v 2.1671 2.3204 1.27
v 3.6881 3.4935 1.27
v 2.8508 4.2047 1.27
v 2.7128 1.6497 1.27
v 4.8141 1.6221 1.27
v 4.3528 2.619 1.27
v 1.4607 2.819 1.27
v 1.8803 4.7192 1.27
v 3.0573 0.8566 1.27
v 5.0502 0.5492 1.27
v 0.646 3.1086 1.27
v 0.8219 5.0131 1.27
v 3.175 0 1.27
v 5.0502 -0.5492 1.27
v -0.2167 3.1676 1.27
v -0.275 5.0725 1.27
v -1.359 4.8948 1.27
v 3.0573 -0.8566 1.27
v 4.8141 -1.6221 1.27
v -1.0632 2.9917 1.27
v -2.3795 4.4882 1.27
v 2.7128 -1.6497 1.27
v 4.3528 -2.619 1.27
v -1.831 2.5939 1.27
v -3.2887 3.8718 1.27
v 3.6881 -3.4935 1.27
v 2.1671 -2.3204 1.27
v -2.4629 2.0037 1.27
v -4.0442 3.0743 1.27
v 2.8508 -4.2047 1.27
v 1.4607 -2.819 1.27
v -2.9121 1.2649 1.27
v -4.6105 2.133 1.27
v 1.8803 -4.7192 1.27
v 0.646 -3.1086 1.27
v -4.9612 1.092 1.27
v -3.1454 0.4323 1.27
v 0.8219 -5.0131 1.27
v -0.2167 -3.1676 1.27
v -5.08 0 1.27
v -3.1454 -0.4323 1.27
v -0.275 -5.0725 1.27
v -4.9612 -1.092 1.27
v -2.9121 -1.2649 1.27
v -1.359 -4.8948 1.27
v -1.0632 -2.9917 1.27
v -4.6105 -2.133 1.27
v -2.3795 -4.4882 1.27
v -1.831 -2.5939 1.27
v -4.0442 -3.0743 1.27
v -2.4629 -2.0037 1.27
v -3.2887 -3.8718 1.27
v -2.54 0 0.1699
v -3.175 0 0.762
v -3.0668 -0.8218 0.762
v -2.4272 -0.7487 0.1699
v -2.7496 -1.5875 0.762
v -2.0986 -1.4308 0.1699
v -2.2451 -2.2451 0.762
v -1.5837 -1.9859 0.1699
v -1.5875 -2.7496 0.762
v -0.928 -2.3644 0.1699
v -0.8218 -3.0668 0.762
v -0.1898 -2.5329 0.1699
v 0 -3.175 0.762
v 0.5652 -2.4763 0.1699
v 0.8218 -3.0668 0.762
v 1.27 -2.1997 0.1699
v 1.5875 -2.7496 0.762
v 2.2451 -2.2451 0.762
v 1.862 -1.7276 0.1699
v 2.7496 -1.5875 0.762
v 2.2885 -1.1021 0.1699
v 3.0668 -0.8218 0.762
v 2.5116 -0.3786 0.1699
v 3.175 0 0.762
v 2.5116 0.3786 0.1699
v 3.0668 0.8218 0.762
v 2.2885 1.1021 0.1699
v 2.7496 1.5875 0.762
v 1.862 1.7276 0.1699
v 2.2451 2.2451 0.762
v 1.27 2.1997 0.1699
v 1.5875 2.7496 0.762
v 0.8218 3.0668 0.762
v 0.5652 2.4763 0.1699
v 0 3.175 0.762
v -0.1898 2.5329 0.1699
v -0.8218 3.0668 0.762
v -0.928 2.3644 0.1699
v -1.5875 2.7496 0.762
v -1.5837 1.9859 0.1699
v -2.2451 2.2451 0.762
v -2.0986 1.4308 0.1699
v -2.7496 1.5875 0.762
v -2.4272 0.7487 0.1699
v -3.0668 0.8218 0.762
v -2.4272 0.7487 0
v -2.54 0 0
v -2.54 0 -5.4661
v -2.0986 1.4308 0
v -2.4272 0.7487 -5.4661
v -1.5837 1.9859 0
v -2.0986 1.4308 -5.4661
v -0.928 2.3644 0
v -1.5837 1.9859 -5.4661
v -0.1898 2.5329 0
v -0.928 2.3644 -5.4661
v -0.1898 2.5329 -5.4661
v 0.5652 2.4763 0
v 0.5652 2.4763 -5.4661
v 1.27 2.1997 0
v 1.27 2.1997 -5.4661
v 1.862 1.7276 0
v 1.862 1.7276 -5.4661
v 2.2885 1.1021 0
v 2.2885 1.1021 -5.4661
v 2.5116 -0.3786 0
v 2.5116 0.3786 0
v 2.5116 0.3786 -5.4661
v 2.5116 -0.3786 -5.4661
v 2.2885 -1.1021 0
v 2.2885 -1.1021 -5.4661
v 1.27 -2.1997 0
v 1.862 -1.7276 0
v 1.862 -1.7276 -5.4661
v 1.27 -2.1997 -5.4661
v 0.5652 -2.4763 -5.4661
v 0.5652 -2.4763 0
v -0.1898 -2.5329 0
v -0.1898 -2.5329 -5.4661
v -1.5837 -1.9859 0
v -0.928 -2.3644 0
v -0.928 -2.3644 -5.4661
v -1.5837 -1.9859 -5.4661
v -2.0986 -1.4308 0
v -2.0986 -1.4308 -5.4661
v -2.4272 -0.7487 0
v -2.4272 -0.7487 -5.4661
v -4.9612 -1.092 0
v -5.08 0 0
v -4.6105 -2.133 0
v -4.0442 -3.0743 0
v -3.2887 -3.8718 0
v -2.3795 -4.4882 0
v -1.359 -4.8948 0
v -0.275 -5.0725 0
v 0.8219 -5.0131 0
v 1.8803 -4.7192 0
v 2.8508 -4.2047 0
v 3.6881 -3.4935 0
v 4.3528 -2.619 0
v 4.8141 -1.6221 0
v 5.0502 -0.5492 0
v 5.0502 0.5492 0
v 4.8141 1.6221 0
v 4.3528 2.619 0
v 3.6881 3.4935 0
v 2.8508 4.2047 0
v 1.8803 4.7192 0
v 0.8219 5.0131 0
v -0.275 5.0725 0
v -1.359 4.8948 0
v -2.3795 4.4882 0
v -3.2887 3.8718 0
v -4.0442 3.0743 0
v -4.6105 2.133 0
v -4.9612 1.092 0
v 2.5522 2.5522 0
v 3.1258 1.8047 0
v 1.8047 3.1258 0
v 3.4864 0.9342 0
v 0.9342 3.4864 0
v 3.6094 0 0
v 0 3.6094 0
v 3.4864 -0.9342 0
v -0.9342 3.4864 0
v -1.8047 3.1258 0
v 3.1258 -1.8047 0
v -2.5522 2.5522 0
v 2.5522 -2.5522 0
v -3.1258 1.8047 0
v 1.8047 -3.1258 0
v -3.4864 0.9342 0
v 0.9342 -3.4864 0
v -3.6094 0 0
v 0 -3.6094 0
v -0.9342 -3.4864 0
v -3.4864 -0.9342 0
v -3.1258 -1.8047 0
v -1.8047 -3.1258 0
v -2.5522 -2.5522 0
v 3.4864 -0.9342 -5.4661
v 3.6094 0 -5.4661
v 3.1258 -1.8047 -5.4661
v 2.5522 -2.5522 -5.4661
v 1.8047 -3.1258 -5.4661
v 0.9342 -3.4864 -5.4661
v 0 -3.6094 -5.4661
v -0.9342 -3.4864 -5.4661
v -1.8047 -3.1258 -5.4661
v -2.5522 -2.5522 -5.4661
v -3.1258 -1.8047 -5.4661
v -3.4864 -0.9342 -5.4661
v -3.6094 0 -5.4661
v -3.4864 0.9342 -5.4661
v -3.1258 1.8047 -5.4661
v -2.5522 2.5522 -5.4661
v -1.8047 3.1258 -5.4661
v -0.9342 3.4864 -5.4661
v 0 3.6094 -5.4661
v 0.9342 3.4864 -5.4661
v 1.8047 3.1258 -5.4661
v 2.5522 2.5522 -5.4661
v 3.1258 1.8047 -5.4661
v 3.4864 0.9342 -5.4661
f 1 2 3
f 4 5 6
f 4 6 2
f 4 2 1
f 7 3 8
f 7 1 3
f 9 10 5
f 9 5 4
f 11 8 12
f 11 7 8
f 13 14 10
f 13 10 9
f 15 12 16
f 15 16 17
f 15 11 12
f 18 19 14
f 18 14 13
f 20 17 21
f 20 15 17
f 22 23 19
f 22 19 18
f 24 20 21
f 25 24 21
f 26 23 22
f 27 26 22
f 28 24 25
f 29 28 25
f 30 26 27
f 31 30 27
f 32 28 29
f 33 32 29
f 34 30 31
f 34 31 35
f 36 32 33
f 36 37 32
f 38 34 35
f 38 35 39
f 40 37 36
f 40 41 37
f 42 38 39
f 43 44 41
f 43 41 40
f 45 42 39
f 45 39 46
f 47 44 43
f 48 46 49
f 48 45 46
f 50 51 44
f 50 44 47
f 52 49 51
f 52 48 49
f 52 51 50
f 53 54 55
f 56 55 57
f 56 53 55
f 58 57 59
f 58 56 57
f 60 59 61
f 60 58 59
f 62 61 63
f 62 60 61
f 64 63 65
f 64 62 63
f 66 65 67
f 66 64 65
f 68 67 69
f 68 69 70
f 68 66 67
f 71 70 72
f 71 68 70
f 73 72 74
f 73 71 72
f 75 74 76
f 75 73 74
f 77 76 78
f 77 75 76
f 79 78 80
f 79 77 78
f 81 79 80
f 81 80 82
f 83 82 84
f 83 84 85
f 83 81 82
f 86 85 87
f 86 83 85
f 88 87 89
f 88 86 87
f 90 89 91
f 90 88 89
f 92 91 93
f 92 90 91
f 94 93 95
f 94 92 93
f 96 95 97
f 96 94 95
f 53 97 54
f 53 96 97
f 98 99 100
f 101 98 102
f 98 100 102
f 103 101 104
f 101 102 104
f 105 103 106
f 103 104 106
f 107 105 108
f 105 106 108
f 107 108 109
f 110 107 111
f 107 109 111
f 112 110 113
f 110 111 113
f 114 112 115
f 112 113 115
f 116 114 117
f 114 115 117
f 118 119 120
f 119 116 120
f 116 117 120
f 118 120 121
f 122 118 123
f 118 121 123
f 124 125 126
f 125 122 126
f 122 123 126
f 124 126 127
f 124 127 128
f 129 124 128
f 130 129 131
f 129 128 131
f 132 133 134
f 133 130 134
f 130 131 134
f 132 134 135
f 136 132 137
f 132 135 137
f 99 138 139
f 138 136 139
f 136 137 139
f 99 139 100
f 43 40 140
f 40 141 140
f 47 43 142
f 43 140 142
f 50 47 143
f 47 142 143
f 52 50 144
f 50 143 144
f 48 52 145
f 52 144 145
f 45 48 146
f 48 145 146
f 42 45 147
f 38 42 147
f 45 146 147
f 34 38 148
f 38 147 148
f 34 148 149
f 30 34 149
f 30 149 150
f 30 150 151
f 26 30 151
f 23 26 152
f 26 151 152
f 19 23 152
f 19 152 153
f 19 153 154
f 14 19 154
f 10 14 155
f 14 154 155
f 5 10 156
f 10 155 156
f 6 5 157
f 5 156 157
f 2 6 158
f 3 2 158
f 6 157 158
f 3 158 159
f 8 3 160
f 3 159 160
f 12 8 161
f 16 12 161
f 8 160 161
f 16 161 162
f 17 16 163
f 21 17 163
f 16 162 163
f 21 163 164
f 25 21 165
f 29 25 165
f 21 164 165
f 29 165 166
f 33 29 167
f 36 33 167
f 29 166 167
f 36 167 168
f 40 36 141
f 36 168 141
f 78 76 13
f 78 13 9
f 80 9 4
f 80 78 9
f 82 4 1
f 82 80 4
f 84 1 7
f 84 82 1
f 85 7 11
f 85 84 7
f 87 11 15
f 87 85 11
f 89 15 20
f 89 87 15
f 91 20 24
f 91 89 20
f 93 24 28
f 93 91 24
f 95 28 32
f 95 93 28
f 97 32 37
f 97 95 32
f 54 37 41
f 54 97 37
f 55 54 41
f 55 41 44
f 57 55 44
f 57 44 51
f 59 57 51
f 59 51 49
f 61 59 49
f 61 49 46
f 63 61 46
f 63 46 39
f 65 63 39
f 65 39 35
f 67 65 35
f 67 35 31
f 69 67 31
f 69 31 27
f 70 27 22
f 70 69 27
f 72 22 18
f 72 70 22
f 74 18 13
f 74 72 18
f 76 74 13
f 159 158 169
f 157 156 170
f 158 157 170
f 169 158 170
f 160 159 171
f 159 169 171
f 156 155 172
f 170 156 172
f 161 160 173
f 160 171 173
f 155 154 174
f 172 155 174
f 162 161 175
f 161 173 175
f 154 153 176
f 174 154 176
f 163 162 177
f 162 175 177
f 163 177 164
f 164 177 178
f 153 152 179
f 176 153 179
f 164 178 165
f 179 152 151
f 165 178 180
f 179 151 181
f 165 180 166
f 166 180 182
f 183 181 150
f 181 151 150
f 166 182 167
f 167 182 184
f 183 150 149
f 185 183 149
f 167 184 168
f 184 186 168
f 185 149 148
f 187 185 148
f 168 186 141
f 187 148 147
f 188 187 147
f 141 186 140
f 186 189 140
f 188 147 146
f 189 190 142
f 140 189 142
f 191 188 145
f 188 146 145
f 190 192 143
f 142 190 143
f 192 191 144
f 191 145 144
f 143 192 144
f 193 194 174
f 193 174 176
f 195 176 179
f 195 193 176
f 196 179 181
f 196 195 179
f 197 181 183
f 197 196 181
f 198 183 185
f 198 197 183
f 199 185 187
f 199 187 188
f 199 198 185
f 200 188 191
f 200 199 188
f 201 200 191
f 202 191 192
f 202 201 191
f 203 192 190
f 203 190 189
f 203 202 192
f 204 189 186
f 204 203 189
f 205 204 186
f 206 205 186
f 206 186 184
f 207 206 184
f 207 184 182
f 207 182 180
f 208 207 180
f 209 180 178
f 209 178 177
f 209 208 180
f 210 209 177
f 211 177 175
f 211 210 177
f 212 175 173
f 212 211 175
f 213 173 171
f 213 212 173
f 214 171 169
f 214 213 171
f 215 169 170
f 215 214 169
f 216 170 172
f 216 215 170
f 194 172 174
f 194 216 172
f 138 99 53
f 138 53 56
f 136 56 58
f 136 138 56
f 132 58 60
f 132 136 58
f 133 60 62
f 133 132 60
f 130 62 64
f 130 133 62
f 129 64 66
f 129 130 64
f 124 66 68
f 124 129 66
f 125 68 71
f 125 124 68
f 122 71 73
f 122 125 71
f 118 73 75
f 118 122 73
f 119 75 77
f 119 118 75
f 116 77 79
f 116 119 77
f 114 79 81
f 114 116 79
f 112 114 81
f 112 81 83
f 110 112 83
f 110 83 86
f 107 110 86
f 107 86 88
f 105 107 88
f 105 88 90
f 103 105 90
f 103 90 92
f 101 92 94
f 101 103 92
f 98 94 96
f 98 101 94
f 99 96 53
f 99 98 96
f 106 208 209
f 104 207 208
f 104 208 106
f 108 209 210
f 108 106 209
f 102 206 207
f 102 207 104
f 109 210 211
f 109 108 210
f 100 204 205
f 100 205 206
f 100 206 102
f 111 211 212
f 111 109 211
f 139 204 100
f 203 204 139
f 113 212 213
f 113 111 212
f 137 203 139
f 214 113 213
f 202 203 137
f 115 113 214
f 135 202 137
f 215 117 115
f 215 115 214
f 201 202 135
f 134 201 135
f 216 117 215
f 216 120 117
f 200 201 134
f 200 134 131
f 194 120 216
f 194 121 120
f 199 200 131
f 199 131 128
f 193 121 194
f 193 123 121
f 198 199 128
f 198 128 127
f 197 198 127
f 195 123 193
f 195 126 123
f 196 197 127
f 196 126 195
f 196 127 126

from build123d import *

# Parameters (mm, degrees)
SKETCH1_R           = 5.08
SKETCH1_R_2         = 2.54
BOSS_EXTRUDE1_DEPTH = 0.762
CHAMFER2_SIZE       = 0.635
CHAMFER2_SIZE2      = 0.59214708
SKETCH3_R           = 5.08
SKETCH3_R_2         = 3.175
BOSS_EXTRUDE3_DEPTH = 0.508
BOSS_EXTRUDE4_START = 5.46608
SKETCH4_R           = 3.609397664
SKETCH4_R_2         = 2.54
BOSS_EXTRUDE4_DEPTH = 5.46608


with BuildPart() as part:
    # Sketch1 → Boss-Extrude1 (new body)
    with BuildSketch(Plane.XY):
        with Locations(Location((0, 0, 0), (0, 0, 180))):
            Circle(SKETCH1_R)
        with Locations(Location((0, 0, 0), (0, 0, 180))):
            Circle(SKETCH1_R_2, mode=Mode.SUBTRACT)
    extrude(amount=BOSS_EXTRUDE1_DEPTH)

    # Chamfer2
    chamfer2_edges = [part.edges().sort_by_distance(p)[0] for p in [
        (2.54, 0, 0.762),
    ]]
    chamfer2_side = [part.faces().sort_by_distance(p)[0] for p in [
        (4.936315902, 0, 0.762),
    ]]
    chamfer(chamfer2_edges, length=CHAMFER2_SIZE, length2=CHAMFER2_SIZE2, reference=chamfer2_side[0])

    # Sketch3 → Boss-Extrude3 (add)
    with BuildSketch(Plane.XY.offset(0.762)):
        with Locations(Location((0, 0, 0), (0, 0, 180))):
            Circle(SKETCH3_R)
        Circle(SKETCH3_R_2, mode=Mode.SUBTRACT)
    extrude(amount=BOSS_EXTRUDE3_DEPTH)

    # Sketch4 → Boss-Extrude4 (add)
    with BuildSketch(Plane(origin=(0, 0, 0), x_dir=(-1, 0, 0), z_dir=(0, 0, -1)).offset(BOSS_EXTRUDE4_START)):
        with Locations(Location((0, 0, 0), (0, 0, 180))):
            Circle(SKETCH4_R)
        Circle(SKETCH4_R_2, mode=Mode.SUBTRACT)
    extrude(amount=-BOSS_EXTRUDE4_DEPTH)


solid = part.part
